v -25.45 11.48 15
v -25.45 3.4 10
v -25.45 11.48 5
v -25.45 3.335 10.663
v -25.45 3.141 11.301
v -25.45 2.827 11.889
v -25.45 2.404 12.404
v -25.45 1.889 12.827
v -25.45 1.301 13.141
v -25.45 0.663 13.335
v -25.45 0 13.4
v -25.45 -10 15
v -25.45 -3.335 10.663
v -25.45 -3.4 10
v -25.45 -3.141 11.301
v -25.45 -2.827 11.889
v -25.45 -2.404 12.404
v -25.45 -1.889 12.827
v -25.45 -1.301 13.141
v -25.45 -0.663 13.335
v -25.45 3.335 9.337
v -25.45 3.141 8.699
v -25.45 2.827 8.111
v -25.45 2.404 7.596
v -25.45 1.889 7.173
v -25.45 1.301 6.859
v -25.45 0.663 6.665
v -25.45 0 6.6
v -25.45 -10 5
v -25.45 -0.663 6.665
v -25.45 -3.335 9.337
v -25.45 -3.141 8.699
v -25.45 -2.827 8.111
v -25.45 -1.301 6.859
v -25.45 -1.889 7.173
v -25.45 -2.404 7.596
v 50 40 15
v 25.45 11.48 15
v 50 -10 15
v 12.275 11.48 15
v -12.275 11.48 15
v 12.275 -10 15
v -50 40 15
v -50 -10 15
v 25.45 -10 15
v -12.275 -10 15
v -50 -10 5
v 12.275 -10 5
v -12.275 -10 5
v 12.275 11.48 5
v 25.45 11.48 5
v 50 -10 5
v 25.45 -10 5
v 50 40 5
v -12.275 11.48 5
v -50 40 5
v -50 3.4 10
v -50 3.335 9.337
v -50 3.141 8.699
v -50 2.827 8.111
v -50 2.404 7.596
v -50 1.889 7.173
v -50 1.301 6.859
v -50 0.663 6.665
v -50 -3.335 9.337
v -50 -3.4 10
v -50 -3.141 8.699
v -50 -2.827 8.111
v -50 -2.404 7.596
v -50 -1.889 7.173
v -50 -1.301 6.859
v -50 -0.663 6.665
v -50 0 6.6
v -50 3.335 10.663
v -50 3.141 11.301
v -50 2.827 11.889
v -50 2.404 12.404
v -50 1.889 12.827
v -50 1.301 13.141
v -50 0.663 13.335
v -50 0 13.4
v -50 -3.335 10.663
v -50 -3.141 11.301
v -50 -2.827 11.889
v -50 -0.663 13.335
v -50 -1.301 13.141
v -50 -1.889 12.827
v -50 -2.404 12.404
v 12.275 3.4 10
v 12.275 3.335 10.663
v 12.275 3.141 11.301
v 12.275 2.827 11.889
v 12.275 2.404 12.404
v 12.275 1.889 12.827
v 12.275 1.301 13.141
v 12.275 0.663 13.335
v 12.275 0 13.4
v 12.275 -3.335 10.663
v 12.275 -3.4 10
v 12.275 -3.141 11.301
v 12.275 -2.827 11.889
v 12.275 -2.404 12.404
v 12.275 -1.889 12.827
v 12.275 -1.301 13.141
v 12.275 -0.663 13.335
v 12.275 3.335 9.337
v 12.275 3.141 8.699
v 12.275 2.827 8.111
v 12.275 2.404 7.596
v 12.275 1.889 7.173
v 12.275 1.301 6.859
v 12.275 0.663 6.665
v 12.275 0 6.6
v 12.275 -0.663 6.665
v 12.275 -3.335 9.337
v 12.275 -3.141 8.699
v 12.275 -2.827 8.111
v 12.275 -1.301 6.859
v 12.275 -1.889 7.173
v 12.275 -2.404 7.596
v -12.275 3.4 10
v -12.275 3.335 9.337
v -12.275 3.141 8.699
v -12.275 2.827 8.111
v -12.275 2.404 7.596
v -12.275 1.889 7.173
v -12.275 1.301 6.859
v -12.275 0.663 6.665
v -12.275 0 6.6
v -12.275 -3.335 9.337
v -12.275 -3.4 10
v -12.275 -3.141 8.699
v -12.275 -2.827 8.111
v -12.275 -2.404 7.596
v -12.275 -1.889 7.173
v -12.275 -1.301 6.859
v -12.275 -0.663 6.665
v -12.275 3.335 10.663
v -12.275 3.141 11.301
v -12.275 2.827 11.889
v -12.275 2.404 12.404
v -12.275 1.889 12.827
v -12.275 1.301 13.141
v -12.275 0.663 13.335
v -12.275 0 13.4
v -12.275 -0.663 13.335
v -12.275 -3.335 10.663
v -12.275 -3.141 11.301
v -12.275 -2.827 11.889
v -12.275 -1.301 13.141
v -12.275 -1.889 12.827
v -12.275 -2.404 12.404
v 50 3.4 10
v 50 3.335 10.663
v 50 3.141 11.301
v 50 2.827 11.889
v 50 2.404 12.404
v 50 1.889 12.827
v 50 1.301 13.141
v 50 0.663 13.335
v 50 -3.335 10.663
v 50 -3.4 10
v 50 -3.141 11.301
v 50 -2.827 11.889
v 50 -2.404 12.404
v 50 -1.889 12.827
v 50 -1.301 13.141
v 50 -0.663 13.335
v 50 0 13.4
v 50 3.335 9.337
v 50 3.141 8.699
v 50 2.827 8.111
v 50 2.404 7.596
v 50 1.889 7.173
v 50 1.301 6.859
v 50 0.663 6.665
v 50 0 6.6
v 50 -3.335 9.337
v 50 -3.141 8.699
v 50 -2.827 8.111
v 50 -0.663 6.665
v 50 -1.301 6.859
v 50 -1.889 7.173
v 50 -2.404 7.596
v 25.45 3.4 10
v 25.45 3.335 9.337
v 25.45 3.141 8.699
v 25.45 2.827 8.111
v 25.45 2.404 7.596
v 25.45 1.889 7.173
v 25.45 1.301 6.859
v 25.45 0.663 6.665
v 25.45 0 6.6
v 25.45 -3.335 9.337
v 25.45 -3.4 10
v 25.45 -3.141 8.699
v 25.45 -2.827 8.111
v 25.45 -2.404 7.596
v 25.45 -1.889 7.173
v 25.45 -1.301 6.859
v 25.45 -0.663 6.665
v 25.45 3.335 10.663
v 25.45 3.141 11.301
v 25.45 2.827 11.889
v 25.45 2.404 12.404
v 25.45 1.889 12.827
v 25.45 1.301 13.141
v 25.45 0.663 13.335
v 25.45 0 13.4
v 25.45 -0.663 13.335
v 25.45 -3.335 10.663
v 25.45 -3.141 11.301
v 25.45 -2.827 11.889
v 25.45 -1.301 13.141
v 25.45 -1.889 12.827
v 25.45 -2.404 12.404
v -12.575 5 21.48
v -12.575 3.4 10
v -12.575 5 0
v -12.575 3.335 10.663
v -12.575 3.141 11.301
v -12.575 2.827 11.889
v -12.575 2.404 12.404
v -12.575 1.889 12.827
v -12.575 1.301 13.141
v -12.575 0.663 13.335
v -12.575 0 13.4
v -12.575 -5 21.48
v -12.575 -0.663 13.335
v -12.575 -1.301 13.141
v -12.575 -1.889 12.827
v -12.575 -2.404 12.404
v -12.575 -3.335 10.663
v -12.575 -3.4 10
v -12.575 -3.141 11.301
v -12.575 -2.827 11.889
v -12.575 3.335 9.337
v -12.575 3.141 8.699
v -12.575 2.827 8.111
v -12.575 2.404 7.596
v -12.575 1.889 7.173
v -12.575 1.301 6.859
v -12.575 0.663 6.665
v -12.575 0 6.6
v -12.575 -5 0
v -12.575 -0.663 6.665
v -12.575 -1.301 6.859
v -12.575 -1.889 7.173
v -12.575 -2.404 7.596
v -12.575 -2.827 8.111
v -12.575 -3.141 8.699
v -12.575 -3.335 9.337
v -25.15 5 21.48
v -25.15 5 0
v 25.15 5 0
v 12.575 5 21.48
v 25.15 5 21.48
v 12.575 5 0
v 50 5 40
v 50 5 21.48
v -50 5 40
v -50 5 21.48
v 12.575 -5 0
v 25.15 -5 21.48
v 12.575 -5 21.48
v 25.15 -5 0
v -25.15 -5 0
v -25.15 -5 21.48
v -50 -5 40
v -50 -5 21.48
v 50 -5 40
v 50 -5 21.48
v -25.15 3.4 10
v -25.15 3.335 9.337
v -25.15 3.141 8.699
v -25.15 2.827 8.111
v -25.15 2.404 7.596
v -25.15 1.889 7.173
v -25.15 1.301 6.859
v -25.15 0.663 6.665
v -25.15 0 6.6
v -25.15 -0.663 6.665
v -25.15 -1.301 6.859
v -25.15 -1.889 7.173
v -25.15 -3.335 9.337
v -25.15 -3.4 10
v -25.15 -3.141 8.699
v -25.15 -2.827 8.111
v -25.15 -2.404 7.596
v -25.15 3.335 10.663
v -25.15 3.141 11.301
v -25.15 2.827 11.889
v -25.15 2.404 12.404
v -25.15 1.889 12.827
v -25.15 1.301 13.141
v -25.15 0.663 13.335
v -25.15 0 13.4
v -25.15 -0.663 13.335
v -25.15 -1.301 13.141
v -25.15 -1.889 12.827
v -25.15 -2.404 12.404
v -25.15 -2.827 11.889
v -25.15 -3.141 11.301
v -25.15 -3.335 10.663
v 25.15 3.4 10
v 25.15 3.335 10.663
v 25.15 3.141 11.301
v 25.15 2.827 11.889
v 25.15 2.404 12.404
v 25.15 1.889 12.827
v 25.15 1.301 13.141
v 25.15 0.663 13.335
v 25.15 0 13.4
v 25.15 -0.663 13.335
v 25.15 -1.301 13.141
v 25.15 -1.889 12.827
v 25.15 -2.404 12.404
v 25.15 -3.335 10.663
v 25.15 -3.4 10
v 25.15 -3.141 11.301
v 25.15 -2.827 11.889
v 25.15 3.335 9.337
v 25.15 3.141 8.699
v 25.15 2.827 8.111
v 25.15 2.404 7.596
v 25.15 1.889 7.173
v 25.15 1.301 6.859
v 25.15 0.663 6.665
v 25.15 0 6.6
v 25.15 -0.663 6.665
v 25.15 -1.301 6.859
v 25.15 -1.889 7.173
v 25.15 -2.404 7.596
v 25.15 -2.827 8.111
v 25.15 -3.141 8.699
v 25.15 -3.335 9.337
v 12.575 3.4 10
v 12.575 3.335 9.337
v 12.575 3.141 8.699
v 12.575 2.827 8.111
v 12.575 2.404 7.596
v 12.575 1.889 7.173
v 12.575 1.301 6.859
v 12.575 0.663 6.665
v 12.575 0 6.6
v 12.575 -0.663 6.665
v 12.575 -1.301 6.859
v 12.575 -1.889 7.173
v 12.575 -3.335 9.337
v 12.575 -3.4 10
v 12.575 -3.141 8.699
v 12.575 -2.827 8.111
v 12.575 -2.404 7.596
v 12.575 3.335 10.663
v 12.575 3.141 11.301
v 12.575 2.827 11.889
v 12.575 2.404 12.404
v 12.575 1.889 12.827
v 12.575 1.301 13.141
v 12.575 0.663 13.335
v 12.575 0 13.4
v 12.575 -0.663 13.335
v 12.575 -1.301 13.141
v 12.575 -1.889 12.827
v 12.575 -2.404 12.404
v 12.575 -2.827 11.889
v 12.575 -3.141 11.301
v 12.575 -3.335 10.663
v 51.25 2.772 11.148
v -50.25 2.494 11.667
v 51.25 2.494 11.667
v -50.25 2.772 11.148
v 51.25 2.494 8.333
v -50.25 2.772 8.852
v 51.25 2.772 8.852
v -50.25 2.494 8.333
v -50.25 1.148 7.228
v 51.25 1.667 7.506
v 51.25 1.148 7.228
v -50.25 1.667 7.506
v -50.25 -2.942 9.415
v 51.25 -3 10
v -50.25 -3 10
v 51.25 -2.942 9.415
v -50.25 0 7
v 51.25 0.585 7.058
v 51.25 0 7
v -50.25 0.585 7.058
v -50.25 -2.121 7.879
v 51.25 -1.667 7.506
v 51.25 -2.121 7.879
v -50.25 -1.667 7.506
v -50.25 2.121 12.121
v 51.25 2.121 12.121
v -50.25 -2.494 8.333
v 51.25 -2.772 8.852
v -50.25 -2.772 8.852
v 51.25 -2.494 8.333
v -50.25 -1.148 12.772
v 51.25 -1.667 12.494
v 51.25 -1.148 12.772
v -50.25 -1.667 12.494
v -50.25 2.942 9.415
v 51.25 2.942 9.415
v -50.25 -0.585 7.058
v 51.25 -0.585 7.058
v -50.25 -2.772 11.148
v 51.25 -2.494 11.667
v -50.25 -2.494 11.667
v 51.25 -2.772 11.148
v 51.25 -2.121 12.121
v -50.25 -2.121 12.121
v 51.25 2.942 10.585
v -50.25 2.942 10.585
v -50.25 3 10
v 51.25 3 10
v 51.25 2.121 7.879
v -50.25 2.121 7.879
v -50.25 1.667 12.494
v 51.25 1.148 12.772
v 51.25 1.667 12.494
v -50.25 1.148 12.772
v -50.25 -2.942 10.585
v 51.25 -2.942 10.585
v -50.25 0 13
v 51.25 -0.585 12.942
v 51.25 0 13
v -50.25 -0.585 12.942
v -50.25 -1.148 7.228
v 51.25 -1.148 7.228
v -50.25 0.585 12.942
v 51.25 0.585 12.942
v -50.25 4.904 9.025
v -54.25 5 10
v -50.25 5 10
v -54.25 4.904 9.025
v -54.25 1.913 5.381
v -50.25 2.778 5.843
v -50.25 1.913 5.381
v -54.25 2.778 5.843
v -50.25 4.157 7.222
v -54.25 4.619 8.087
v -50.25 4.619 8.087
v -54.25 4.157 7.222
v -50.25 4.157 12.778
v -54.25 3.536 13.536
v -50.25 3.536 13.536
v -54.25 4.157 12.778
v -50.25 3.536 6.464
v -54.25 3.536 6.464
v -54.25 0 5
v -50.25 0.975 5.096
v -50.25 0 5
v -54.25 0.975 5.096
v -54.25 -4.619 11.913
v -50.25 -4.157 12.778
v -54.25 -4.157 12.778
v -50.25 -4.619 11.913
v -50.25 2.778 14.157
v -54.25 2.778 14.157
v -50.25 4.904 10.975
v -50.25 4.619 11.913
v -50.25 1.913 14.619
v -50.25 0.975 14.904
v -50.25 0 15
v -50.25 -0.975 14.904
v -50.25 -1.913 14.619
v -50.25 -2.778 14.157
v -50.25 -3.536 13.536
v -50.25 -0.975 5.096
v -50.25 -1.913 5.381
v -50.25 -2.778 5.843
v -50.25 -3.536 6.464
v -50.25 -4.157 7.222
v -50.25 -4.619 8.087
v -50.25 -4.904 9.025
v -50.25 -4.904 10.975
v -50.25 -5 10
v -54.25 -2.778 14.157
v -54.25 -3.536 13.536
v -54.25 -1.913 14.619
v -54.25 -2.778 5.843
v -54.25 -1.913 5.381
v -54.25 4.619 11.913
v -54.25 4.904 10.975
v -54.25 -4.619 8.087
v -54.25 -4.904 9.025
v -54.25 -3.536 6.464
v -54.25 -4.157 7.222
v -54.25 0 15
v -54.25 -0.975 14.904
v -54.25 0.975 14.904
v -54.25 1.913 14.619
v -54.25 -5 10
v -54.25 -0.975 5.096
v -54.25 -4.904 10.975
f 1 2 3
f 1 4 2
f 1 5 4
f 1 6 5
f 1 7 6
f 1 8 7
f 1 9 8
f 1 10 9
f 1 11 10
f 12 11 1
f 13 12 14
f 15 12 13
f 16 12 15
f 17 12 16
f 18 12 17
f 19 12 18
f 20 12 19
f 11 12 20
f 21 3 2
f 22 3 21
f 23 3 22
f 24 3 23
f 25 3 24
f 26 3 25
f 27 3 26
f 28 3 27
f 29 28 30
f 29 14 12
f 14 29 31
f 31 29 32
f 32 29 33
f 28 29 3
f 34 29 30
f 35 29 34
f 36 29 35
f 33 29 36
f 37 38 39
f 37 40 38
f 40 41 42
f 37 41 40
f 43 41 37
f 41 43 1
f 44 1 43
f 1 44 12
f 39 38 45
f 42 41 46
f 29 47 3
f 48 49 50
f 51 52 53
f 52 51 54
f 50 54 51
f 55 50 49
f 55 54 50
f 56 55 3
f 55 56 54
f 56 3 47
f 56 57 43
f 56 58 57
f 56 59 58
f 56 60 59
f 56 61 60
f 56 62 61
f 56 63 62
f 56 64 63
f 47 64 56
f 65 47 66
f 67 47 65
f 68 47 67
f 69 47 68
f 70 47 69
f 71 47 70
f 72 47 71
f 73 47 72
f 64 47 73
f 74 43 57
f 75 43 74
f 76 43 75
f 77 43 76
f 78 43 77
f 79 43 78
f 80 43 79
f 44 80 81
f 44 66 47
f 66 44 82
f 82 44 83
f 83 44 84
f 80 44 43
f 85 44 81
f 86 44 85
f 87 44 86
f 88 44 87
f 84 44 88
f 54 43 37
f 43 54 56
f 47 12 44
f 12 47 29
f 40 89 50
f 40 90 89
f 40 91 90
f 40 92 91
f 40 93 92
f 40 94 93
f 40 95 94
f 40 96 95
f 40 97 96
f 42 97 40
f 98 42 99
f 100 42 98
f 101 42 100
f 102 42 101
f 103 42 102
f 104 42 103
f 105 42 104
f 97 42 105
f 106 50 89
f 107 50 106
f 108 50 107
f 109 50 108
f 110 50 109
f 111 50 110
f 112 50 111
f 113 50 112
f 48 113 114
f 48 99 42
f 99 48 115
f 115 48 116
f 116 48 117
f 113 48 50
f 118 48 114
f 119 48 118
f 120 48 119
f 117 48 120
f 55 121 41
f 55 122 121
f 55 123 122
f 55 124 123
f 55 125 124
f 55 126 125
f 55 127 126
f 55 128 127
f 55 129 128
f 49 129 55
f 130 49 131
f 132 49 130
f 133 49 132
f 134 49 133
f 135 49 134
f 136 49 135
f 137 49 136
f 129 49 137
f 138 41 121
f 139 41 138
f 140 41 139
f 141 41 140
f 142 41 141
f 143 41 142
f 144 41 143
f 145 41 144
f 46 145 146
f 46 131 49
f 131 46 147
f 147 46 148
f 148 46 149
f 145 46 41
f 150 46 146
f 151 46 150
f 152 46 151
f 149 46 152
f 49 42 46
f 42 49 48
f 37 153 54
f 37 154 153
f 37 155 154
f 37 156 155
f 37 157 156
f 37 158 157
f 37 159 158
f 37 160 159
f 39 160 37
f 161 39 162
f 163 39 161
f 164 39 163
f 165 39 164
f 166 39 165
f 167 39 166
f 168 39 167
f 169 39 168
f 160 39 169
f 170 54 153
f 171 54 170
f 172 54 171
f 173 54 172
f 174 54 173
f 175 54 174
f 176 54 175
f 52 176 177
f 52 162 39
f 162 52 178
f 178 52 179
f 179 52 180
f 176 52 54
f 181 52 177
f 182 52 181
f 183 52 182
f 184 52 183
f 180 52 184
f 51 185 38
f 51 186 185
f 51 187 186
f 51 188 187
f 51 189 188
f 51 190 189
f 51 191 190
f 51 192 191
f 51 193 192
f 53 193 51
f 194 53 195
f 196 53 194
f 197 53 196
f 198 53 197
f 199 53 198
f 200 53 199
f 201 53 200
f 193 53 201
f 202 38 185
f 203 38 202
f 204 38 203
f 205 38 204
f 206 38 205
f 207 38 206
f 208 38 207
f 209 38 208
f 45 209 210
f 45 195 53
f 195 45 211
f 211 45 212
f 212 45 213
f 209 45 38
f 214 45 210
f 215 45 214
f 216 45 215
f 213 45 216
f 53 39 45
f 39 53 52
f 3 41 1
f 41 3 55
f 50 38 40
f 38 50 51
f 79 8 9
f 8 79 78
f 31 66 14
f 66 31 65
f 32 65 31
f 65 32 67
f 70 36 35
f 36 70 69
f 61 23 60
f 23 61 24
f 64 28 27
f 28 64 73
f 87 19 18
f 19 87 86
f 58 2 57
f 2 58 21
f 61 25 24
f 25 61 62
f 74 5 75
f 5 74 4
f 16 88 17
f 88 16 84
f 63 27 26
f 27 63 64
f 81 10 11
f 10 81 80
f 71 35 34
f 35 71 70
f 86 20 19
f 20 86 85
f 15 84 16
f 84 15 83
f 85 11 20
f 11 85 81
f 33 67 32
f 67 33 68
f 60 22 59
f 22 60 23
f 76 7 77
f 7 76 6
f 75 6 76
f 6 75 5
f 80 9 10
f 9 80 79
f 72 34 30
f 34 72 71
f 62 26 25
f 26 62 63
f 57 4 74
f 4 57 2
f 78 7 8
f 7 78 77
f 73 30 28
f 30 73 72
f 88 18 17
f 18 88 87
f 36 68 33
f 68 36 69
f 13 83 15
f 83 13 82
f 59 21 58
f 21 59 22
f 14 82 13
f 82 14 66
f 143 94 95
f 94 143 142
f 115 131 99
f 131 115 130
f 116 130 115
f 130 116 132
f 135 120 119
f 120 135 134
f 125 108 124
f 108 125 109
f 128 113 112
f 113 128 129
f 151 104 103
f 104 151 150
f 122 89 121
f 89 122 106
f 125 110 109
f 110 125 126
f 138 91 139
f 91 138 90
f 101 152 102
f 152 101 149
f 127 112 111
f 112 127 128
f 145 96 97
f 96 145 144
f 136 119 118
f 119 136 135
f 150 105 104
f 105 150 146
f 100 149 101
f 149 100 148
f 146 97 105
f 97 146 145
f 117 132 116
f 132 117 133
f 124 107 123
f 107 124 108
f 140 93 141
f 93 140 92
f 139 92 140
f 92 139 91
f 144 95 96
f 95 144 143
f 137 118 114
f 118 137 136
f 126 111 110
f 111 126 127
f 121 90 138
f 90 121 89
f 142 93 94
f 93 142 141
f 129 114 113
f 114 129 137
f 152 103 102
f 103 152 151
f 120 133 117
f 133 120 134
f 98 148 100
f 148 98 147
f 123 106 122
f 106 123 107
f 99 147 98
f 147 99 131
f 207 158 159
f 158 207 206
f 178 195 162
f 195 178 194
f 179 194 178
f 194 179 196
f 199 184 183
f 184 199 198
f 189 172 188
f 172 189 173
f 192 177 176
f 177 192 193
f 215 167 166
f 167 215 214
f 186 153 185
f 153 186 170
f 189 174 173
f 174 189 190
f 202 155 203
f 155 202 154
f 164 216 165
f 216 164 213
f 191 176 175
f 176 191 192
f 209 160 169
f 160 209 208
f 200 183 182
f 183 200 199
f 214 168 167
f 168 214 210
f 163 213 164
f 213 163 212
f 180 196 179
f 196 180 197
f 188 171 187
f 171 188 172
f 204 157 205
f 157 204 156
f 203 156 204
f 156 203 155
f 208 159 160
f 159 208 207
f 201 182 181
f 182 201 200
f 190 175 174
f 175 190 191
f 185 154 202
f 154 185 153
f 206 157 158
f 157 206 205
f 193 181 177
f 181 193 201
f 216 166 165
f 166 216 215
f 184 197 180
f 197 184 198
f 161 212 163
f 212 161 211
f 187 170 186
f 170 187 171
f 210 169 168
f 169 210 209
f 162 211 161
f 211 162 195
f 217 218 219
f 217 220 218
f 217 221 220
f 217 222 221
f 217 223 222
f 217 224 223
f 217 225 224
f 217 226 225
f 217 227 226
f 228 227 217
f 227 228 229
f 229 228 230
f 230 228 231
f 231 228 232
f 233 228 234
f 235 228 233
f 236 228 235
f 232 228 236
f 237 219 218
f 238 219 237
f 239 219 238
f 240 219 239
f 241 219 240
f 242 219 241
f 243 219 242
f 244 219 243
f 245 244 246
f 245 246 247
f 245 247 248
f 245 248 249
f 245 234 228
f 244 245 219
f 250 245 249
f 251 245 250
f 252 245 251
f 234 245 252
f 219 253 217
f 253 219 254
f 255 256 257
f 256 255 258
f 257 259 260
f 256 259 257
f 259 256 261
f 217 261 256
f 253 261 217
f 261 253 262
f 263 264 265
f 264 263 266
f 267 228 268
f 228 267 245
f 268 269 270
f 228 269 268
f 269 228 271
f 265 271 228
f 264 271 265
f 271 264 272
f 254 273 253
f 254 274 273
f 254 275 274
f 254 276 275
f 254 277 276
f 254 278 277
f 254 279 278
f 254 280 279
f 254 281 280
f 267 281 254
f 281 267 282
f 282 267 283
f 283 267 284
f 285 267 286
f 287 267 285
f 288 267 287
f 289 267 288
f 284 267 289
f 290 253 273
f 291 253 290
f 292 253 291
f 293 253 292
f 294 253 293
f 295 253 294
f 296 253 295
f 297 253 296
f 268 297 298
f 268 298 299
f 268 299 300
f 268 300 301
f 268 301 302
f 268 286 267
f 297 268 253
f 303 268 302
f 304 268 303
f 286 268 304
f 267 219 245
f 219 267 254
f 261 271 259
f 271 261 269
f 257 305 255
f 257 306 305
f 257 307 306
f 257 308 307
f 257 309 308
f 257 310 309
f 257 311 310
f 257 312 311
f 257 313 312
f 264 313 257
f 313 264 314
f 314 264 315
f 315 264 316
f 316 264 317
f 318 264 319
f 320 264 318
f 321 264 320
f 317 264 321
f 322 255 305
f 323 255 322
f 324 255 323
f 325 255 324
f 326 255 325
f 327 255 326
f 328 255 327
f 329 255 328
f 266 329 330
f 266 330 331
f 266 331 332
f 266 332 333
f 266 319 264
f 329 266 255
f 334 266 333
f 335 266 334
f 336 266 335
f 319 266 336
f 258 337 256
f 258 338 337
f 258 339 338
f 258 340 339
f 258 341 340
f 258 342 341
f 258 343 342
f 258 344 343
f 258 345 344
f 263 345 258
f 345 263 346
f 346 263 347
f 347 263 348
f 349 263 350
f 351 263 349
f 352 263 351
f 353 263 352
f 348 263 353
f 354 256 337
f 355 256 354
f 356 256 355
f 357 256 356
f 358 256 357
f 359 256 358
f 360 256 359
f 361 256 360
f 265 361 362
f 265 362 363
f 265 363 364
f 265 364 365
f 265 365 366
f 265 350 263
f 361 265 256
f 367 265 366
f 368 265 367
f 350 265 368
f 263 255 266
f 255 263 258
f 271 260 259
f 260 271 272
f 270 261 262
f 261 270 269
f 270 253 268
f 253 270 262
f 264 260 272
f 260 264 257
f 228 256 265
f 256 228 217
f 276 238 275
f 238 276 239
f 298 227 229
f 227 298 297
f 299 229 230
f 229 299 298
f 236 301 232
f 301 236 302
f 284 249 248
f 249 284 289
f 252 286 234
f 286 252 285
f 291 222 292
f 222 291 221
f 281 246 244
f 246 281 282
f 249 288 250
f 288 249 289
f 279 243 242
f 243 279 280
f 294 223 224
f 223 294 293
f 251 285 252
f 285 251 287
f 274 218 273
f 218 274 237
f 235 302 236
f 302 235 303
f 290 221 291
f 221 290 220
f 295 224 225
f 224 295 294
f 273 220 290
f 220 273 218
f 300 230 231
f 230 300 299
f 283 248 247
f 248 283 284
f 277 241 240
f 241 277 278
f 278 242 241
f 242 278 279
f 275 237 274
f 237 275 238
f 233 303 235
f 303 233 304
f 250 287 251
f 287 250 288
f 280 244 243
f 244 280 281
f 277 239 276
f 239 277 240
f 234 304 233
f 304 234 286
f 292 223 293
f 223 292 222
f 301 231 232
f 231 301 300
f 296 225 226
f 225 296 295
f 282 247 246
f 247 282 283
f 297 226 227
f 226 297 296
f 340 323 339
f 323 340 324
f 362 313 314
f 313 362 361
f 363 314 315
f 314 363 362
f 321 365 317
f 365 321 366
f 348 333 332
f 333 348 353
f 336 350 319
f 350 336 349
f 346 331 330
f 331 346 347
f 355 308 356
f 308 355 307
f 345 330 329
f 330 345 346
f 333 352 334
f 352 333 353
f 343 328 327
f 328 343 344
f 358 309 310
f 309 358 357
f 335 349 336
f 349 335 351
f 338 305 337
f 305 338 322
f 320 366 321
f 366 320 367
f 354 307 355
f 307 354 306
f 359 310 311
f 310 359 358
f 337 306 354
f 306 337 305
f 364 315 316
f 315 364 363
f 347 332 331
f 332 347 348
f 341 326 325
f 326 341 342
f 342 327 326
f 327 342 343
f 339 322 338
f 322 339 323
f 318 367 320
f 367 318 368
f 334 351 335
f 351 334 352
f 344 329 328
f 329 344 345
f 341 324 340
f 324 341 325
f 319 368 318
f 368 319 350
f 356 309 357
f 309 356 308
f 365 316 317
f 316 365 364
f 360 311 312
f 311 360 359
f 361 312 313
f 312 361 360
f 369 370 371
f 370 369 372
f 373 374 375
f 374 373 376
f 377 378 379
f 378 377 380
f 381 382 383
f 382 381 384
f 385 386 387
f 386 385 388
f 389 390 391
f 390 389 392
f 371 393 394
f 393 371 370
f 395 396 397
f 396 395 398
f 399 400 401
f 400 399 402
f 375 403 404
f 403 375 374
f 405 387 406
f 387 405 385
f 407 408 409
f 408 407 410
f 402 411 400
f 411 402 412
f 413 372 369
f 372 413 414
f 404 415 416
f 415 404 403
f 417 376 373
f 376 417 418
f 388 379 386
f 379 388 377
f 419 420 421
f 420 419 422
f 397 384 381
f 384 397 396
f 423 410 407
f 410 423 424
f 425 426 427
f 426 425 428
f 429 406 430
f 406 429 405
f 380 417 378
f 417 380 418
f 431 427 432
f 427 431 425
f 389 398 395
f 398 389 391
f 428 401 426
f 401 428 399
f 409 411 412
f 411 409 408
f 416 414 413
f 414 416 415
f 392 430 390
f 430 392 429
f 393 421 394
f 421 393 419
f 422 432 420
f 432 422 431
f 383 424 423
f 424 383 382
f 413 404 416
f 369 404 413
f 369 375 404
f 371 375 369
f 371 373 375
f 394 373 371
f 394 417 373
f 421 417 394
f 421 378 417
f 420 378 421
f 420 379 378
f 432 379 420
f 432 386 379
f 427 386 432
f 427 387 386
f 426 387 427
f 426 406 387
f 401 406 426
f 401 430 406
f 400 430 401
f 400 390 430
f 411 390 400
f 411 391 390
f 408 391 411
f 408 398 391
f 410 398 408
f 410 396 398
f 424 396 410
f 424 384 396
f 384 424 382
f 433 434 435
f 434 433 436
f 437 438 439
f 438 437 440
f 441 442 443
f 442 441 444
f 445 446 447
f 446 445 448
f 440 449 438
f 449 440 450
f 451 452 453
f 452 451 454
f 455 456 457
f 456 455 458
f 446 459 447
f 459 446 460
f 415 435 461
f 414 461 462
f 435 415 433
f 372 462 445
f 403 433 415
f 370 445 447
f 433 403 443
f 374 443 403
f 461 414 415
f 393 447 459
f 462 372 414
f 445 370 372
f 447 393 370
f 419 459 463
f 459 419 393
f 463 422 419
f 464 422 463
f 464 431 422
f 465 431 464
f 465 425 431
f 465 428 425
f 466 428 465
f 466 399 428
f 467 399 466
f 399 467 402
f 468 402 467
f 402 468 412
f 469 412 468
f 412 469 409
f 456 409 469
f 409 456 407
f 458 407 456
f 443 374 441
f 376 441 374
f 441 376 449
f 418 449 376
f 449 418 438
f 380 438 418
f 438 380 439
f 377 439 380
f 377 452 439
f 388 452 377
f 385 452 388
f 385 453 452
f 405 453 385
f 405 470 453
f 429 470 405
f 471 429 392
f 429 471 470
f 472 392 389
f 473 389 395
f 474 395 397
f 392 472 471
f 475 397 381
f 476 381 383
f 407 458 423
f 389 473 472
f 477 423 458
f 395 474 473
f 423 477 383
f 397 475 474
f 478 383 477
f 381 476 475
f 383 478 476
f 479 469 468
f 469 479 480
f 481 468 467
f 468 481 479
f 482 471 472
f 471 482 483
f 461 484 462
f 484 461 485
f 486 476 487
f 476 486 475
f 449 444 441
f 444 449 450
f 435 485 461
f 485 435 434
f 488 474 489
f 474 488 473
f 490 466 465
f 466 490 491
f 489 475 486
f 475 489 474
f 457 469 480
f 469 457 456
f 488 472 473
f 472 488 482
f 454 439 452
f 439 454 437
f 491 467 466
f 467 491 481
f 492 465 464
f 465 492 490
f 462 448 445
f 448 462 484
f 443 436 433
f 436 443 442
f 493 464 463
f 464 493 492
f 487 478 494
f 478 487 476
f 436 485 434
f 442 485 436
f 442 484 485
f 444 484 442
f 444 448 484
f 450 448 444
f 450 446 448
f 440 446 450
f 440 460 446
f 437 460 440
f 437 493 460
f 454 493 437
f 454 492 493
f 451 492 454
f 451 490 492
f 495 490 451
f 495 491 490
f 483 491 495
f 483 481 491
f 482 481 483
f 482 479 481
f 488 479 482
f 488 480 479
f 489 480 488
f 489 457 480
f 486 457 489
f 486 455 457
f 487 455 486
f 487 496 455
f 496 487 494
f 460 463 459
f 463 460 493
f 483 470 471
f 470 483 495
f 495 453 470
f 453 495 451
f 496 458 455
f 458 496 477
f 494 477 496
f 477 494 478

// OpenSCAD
$fn = 32;

// ------------------------------------------------------------------------
// Butt hinge: hinge 100 mm, leaf swung 270 deg
// Every part is its own module, assembly() places every instance.
// ------------------------------------------------------------------------

// --- part 1 ---
module hinge_base() {
  difference() {
    union() {
      translate([-50, -10, -5]) cube([24.55, 50, 10]);
      translate([-12.275, -10, -5]) cube([24.55, 50, 10]);
      translate([25.45, -10, -5]) cube([24.55, 50, 10]);
      translate([-50, 11.48, -5]) cube([100, 28.52, 10]);
    }
    translate([-37.725, 0, 0]) rotate([0, 90, 0]) cylinder(h = 26.55, d = 6.8, center = true);
    translate([0, 0, 0]) rotate([0, 90, 0]) cylinder(h = 26.55, d = 6.8, center = true);
    translate([37.725, 0, 0]) rotate([0, 90, 0]) cylinder(h = 26.55, d = 6.8, center = true);
  }
}

// --- part 2 ---
module hinge_mover() {
  difference() {
    union() {
      translate([-25.15, -30, -5]) cube([12.575, 40, 10]);
      translate([12.575, -30, -5]) cube([12.575, 40, 10]);
      translate([-50, -30, -5]) cube([100, 18.52, 10]);
    }
    translate([-18.863, 0, 0]) rotate([0, 90, 0]) cylinder(h = 14.575, d = 6.8, center = true);
    translate([18.863, 0, 0]) rotate([0, 90, 0]) cylinder(h = 14.575, d = 6.8, center = true);
  }
}

// --- part 3 ---
module hinge_pin() {
  rotate([0, 90, 0]) cylinder(h = 102.5, d = 6, center = true);
  translate([-54.25, 0, 0]) rotate([0, 90, 0]) cylinder(h = 4, d = 10);
}

// --- assembly ---
module assembly() {
  color([0.80, 0.24, 0.20]) translate([0, 0, 10]) rotate([0, 0, 0]) hinge_base();
  color([0.20, 0.45, 0.75]) translate([0, 0, 10]) rotate([270, 0, 0]) hinge_mover();
  color([0.25, 0.62, 0.32]) translate([0, 0, 10]) rotate([0, 0, 0]) hinge_pin();
}

assembly();
